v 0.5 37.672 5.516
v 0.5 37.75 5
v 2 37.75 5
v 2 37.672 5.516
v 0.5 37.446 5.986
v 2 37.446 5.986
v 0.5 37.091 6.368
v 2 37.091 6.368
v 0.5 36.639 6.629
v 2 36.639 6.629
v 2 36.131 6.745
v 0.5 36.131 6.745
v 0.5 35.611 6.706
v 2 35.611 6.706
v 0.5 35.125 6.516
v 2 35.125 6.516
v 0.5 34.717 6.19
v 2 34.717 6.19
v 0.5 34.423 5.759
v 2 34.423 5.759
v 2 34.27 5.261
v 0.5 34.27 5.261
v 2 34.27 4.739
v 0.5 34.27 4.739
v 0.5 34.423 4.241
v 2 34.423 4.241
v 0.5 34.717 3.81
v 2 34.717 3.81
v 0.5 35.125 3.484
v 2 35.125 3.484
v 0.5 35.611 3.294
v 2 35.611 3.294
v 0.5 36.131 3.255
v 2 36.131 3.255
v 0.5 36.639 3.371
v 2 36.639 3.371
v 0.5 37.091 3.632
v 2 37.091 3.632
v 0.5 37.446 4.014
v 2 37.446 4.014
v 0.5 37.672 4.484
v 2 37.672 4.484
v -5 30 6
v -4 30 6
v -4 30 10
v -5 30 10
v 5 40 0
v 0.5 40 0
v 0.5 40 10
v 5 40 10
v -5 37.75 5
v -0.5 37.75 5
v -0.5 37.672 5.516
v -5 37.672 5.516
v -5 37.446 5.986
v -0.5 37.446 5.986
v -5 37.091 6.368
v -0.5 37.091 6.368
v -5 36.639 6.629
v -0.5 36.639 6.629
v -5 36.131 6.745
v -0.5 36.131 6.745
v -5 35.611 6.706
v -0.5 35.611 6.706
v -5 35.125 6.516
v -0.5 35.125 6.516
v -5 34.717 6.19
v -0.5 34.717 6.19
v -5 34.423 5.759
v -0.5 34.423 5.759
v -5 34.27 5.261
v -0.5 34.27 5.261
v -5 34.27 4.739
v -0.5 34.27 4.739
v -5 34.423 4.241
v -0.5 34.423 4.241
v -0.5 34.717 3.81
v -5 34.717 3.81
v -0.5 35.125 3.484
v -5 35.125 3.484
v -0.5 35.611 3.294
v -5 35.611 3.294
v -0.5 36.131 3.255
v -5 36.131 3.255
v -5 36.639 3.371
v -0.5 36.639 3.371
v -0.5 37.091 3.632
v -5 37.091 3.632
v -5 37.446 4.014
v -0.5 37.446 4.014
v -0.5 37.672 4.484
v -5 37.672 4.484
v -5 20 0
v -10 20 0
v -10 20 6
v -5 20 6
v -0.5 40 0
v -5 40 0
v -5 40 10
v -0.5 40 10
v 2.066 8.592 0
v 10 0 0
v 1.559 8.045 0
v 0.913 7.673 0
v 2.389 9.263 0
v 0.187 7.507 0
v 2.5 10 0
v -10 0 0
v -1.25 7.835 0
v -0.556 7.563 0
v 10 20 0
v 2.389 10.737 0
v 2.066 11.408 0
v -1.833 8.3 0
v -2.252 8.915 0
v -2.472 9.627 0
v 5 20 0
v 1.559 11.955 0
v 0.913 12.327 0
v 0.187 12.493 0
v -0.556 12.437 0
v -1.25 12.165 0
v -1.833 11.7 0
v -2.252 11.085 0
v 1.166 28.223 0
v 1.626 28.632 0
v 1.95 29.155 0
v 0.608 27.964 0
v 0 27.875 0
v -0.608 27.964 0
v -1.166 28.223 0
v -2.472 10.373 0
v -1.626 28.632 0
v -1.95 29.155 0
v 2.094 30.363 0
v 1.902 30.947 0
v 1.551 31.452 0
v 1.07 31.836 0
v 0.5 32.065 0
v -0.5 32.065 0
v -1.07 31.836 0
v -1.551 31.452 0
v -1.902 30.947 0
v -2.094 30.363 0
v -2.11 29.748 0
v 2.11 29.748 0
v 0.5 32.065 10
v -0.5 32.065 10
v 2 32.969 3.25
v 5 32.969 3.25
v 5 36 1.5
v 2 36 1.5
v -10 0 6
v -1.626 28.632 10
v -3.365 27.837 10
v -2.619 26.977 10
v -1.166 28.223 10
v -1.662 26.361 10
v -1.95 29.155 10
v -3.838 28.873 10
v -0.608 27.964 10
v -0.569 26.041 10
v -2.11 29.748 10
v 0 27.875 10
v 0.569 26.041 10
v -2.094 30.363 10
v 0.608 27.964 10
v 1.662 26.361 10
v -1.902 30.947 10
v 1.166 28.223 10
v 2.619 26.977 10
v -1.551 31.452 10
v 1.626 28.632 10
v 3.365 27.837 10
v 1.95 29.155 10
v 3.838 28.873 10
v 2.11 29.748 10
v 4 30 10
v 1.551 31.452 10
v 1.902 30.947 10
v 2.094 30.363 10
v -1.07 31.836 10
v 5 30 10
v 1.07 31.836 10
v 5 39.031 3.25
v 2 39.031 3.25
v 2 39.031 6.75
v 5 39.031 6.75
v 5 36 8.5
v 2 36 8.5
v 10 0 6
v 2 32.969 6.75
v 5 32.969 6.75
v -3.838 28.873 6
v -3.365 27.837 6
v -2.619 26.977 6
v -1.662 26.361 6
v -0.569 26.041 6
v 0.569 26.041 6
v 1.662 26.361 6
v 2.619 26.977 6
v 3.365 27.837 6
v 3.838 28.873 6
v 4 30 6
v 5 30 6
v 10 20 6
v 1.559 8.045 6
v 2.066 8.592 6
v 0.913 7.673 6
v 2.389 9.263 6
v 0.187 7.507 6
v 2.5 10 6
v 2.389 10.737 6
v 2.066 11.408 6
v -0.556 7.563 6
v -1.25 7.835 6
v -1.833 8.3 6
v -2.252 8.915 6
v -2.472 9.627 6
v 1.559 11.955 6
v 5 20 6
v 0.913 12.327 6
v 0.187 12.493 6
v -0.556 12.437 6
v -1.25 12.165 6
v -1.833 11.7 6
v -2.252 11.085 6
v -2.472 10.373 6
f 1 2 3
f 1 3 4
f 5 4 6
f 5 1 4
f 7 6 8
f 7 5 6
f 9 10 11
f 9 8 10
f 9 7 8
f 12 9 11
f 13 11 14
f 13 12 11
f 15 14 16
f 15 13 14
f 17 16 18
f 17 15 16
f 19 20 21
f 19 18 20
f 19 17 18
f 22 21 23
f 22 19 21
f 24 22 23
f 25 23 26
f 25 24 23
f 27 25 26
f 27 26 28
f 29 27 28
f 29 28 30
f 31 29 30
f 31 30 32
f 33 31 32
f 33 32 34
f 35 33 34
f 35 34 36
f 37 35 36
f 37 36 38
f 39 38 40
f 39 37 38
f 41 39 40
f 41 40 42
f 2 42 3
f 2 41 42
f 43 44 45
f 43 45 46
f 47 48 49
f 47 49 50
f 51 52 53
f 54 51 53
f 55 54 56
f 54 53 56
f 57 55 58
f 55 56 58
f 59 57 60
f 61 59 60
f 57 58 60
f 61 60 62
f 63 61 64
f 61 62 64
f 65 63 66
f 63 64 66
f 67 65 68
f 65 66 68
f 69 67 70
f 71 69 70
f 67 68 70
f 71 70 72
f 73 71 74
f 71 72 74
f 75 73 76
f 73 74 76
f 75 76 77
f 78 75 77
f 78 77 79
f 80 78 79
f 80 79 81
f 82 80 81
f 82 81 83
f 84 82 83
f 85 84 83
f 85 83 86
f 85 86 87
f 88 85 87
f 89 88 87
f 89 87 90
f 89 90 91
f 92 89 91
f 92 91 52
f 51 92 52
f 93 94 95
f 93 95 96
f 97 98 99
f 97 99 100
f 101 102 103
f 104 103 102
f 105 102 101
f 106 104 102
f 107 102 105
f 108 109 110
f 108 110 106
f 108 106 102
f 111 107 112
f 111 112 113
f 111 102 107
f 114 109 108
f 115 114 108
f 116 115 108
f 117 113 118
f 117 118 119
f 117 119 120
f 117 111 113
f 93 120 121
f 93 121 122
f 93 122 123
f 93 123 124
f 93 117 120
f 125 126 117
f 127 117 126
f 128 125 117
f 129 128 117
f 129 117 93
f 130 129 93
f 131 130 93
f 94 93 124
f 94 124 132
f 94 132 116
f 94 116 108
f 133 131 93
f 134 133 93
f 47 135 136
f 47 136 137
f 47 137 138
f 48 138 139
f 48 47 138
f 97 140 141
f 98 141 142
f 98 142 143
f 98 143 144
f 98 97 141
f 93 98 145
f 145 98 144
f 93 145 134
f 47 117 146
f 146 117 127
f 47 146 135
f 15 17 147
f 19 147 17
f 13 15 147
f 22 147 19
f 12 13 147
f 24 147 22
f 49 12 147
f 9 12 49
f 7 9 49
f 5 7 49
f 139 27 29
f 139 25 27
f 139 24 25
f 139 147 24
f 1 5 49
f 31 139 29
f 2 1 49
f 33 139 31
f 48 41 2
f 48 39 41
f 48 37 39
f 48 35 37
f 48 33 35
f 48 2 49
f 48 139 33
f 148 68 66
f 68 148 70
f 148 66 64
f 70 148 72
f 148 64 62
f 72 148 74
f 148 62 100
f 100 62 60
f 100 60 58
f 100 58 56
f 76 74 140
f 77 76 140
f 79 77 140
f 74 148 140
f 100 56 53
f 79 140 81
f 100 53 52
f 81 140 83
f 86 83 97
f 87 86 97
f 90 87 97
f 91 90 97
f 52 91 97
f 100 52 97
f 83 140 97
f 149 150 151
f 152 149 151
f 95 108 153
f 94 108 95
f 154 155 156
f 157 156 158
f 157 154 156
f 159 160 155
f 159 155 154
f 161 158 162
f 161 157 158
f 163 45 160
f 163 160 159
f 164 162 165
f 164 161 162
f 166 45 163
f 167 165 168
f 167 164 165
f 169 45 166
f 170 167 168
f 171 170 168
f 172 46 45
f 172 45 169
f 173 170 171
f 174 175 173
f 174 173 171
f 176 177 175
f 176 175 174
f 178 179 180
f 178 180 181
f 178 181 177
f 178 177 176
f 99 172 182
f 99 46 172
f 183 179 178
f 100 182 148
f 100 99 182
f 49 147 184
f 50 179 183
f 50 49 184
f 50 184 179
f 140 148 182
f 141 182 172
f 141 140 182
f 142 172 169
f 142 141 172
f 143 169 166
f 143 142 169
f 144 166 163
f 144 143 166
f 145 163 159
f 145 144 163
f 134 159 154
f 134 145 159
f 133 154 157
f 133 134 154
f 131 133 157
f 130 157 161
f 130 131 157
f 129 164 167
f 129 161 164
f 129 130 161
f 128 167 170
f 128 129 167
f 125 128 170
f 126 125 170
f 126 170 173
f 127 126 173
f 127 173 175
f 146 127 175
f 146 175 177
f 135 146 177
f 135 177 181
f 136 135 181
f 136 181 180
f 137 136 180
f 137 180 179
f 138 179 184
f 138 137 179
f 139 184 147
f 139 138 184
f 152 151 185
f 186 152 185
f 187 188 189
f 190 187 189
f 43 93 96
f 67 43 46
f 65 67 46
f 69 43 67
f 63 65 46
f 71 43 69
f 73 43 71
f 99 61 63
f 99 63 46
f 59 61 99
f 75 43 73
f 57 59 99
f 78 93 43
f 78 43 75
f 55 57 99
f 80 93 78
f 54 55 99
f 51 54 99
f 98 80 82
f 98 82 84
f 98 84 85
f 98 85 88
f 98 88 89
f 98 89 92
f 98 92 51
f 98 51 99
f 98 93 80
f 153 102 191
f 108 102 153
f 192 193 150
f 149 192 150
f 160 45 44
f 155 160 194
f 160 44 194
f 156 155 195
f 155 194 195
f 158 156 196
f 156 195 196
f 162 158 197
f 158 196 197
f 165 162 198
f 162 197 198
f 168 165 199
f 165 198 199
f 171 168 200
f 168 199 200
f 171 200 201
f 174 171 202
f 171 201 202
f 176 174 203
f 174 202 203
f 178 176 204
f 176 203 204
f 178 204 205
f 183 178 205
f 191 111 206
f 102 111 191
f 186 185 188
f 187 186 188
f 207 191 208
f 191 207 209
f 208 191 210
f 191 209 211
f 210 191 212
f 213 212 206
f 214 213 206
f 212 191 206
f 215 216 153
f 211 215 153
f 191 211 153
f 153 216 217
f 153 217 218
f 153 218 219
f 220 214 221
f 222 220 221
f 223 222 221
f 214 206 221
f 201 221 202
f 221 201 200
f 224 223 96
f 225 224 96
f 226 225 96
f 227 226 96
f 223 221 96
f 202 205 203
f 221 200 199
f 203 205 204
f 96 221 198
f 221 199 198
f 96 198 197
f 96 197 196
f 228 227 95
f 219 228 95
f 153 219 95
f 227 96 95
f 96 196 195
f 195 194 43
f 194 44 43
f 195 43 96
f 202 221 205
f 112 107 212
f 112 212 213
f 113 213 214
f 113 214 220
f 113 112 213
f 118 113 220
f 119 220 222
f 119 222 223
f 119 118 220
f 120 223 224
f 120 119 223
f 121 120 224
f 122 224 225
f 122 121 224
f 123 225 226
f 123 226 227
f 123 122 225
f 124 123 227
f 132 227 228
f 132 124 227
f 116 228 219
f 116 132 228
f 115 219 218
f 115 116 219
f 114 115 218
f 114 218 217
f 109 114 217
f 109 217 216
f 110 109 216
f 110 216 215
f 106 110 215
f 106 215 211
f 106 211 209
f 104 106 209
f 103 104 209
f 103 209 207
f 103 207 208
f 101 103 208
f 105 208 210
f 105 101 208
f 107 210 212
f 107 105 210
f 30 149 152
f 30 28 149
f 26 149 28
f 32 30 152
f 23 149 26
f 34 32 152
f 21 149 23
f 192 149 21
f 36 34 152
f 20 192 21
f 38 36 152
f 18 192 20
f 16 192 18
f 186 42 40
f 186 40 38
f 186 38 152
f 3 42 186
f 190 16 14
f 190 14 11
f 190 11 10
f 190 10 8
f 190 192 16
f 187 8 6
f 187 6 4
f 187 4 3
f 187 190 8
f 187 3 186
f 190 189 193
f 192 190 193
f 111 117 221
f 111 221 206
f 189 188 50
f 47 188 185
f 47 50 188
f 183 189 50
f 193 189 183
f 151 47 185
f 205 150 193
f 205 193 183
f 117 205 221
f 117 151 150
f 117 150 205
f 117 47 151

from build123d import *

# Parameters (mm, degrees)
SKETCH_R             = 2.125
SKETCH_R_2           = 2.5
PAD_DEPTH            = 6
SKETCH001_R          = 2.125
PAD001_DEPTH         = 10
SKETCH002_W          = 1
SKETCH002_H          = 20
POCKET_DEPTH         = 10.001
SKETCH003_R          = 1.75
POCKET001_DEPTH      = 10.001
POCKET001_DEPTH_BACK = -10.001
POCKET002_DEPTH      = 3


with BuildPart() as part:
    # Sketch → Pad (new body)
    with BuildSketch(Plane.XY):
        Polygon((-5, 40), (5, 40), (5, 20), (10, 20), (10, 0), (-10, 0), (-10, 20), (-5, 20), align=None)
        with Locations((0, 30)):
            Circle(SKETCH_R, mode=Mode.SUBTRACT)
        with Locations((0, 10)):
            Circle(SKETCH_R_2, mode=Mode.SUBTRACT)
    extrude(amount=PAD_DEPTH)

    # Sketch001 → Pad001 (join)
    with BuildSketch(Plane.XY):
        with BuildLine():
            ThreePointArc((-4, 30), (0, 26), (4, 30))
            Line((4, 30), (5, 30))
            Line((5, 30), (5, 40))
            Line((-5, 40), (5, 40))
            Line((-5, 30), (-5, 40))
            Line((-4, 30), (-5, 30))
        make_face()
        with Locations((0, 30)):
            Circle(SKETCH001_R, mode=Mode.SUBTRACT)
    extrude(amount=PAD001_DEPTH)

    # Sketch002 → Pocket (cut, through all)
    with BuildSketch(Plane.XY):
        with Locations((0, 40)):
            Rectangle(SKETCH002_W, SKETCH002_H)
    extrude(amount=POCKET_DEPTH, mode=Mode.SUBTRACT)

    # Sketch003 → Pocket001 (cut, two sides)
    with BuildSketch(Plane.YZ) as pocket001_sk:
        with Locations((36, 5)):
            Circle(SKETCH003_R)
    extrude(amount=-POCKET001_DEPTH, mode=Mode.SUBTRACT)
    extrude(pocket001_sk.sketch, amount=-POCKET001_DEPTH_BACK, mode=Mode.SUBTRACT)

    # Sketch004 (on Face14 of Pocket001) → Pocket002 (cut)
    with BuildSketch(Plane.YZ.offset(5)):
        Polygon((39.031089, 3.25), (39.031089, 6.75), (36, 8.5), (32.968911, 6.75), (32.968911, 3.25), (36, 1.5), align=None)
    extrude(amount=-POCKET002_DEPTH, mode=Mode.SUBTRACT)


solid = part.part
